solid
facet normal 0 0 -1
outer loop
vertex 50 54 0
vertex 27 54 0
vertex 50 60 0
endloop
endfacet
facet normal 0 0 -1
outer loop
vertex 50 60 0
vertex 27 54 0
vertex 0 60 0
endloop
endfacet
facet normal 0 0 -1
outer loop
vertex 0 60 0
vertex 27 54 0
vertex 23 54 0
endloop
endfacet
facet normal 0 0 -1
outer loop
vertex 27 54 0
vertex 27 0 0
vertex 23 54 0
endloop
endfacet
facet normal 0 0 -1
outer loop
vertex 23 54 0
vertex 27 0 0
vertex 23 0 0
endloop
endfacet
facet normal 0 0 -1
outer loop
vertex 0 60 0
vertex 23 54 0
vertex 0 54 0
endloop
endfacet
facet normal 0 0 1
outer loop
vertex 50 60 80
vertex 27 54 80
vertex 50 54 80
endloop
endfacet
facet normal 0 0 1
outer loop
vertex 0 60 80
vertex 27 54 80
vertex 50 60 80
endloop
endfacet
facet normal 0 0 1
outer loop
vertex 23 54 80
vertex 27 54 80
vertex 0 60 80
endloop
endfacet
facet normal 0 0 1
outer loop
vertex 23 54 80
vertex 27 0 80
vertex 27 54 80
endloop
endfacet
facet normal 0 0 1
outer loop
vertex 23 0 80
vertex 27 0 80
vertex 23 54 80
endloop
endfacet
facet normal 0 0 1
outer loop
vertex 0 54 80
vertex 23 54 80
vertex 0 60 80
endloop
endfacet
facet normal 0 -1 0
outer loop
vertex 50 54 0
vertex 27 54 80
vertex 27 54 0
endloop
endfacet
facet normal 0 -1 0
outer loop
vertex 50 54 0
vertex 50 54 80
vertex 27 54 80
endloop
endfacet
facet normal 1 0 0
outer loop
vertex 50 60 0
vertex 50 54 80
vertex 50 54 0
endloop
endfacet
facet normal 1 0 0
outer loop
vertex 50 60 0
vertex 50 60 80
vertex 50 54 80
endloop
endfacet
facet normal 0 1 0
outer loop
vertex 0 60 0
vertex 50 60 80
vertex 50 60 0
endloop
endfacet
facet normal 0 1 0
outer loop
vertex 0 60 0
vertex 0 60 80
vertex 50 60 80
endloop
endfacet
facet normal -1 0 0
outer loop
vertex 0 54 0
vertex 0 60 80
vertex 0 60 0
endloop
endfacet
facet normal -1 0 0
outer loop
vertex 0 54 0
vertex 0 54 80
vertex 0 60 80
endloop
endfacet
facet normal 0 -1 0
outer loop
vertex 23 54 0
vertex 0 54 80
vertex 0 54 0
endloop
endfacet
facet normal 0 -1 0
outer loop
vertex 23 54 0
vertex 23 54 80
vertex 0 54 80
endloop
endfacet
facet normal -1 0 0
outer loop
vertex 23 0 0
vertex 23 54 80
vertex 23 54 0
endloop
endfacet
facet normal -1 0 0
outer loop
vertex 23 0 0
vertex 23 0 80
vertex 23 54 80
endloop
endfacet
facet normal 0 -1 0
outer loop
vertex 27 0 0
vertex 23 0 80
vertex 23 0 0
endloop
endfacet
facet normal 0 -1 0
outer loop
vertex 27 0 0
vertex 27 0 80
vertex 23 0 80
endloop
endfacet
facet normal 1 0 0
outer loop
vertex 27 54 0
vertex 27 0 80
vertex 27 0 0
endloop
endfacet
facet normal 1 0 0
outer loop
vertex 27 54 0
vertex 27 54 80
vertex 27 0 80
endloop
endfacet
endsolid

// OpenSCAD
$fn = 32;

// ----------------------------------------------------------------------
// Structural section: tee 50 x 60 mm
// ----------------------------------------------------------------------

// --- parameters (mm) ---
sec_w = 50;               // tee width, X
sec_h = 60;               // tee height, Y
flange_t = 6;             // top flange thickness
web_t = 4;                // web thickness
plate_t = 80;             // cut length, Z (extrusion height)

profile = [[23, 0], [27, 0], [27, 54], [50, 54], [50, 60], [0, 60], [0, 54], [23, 54]];  // primary outline, 8 points, counter clockwise

// --- the one profile operation ---
linear_extrude(height = plate_t) polygon(points = profile);
